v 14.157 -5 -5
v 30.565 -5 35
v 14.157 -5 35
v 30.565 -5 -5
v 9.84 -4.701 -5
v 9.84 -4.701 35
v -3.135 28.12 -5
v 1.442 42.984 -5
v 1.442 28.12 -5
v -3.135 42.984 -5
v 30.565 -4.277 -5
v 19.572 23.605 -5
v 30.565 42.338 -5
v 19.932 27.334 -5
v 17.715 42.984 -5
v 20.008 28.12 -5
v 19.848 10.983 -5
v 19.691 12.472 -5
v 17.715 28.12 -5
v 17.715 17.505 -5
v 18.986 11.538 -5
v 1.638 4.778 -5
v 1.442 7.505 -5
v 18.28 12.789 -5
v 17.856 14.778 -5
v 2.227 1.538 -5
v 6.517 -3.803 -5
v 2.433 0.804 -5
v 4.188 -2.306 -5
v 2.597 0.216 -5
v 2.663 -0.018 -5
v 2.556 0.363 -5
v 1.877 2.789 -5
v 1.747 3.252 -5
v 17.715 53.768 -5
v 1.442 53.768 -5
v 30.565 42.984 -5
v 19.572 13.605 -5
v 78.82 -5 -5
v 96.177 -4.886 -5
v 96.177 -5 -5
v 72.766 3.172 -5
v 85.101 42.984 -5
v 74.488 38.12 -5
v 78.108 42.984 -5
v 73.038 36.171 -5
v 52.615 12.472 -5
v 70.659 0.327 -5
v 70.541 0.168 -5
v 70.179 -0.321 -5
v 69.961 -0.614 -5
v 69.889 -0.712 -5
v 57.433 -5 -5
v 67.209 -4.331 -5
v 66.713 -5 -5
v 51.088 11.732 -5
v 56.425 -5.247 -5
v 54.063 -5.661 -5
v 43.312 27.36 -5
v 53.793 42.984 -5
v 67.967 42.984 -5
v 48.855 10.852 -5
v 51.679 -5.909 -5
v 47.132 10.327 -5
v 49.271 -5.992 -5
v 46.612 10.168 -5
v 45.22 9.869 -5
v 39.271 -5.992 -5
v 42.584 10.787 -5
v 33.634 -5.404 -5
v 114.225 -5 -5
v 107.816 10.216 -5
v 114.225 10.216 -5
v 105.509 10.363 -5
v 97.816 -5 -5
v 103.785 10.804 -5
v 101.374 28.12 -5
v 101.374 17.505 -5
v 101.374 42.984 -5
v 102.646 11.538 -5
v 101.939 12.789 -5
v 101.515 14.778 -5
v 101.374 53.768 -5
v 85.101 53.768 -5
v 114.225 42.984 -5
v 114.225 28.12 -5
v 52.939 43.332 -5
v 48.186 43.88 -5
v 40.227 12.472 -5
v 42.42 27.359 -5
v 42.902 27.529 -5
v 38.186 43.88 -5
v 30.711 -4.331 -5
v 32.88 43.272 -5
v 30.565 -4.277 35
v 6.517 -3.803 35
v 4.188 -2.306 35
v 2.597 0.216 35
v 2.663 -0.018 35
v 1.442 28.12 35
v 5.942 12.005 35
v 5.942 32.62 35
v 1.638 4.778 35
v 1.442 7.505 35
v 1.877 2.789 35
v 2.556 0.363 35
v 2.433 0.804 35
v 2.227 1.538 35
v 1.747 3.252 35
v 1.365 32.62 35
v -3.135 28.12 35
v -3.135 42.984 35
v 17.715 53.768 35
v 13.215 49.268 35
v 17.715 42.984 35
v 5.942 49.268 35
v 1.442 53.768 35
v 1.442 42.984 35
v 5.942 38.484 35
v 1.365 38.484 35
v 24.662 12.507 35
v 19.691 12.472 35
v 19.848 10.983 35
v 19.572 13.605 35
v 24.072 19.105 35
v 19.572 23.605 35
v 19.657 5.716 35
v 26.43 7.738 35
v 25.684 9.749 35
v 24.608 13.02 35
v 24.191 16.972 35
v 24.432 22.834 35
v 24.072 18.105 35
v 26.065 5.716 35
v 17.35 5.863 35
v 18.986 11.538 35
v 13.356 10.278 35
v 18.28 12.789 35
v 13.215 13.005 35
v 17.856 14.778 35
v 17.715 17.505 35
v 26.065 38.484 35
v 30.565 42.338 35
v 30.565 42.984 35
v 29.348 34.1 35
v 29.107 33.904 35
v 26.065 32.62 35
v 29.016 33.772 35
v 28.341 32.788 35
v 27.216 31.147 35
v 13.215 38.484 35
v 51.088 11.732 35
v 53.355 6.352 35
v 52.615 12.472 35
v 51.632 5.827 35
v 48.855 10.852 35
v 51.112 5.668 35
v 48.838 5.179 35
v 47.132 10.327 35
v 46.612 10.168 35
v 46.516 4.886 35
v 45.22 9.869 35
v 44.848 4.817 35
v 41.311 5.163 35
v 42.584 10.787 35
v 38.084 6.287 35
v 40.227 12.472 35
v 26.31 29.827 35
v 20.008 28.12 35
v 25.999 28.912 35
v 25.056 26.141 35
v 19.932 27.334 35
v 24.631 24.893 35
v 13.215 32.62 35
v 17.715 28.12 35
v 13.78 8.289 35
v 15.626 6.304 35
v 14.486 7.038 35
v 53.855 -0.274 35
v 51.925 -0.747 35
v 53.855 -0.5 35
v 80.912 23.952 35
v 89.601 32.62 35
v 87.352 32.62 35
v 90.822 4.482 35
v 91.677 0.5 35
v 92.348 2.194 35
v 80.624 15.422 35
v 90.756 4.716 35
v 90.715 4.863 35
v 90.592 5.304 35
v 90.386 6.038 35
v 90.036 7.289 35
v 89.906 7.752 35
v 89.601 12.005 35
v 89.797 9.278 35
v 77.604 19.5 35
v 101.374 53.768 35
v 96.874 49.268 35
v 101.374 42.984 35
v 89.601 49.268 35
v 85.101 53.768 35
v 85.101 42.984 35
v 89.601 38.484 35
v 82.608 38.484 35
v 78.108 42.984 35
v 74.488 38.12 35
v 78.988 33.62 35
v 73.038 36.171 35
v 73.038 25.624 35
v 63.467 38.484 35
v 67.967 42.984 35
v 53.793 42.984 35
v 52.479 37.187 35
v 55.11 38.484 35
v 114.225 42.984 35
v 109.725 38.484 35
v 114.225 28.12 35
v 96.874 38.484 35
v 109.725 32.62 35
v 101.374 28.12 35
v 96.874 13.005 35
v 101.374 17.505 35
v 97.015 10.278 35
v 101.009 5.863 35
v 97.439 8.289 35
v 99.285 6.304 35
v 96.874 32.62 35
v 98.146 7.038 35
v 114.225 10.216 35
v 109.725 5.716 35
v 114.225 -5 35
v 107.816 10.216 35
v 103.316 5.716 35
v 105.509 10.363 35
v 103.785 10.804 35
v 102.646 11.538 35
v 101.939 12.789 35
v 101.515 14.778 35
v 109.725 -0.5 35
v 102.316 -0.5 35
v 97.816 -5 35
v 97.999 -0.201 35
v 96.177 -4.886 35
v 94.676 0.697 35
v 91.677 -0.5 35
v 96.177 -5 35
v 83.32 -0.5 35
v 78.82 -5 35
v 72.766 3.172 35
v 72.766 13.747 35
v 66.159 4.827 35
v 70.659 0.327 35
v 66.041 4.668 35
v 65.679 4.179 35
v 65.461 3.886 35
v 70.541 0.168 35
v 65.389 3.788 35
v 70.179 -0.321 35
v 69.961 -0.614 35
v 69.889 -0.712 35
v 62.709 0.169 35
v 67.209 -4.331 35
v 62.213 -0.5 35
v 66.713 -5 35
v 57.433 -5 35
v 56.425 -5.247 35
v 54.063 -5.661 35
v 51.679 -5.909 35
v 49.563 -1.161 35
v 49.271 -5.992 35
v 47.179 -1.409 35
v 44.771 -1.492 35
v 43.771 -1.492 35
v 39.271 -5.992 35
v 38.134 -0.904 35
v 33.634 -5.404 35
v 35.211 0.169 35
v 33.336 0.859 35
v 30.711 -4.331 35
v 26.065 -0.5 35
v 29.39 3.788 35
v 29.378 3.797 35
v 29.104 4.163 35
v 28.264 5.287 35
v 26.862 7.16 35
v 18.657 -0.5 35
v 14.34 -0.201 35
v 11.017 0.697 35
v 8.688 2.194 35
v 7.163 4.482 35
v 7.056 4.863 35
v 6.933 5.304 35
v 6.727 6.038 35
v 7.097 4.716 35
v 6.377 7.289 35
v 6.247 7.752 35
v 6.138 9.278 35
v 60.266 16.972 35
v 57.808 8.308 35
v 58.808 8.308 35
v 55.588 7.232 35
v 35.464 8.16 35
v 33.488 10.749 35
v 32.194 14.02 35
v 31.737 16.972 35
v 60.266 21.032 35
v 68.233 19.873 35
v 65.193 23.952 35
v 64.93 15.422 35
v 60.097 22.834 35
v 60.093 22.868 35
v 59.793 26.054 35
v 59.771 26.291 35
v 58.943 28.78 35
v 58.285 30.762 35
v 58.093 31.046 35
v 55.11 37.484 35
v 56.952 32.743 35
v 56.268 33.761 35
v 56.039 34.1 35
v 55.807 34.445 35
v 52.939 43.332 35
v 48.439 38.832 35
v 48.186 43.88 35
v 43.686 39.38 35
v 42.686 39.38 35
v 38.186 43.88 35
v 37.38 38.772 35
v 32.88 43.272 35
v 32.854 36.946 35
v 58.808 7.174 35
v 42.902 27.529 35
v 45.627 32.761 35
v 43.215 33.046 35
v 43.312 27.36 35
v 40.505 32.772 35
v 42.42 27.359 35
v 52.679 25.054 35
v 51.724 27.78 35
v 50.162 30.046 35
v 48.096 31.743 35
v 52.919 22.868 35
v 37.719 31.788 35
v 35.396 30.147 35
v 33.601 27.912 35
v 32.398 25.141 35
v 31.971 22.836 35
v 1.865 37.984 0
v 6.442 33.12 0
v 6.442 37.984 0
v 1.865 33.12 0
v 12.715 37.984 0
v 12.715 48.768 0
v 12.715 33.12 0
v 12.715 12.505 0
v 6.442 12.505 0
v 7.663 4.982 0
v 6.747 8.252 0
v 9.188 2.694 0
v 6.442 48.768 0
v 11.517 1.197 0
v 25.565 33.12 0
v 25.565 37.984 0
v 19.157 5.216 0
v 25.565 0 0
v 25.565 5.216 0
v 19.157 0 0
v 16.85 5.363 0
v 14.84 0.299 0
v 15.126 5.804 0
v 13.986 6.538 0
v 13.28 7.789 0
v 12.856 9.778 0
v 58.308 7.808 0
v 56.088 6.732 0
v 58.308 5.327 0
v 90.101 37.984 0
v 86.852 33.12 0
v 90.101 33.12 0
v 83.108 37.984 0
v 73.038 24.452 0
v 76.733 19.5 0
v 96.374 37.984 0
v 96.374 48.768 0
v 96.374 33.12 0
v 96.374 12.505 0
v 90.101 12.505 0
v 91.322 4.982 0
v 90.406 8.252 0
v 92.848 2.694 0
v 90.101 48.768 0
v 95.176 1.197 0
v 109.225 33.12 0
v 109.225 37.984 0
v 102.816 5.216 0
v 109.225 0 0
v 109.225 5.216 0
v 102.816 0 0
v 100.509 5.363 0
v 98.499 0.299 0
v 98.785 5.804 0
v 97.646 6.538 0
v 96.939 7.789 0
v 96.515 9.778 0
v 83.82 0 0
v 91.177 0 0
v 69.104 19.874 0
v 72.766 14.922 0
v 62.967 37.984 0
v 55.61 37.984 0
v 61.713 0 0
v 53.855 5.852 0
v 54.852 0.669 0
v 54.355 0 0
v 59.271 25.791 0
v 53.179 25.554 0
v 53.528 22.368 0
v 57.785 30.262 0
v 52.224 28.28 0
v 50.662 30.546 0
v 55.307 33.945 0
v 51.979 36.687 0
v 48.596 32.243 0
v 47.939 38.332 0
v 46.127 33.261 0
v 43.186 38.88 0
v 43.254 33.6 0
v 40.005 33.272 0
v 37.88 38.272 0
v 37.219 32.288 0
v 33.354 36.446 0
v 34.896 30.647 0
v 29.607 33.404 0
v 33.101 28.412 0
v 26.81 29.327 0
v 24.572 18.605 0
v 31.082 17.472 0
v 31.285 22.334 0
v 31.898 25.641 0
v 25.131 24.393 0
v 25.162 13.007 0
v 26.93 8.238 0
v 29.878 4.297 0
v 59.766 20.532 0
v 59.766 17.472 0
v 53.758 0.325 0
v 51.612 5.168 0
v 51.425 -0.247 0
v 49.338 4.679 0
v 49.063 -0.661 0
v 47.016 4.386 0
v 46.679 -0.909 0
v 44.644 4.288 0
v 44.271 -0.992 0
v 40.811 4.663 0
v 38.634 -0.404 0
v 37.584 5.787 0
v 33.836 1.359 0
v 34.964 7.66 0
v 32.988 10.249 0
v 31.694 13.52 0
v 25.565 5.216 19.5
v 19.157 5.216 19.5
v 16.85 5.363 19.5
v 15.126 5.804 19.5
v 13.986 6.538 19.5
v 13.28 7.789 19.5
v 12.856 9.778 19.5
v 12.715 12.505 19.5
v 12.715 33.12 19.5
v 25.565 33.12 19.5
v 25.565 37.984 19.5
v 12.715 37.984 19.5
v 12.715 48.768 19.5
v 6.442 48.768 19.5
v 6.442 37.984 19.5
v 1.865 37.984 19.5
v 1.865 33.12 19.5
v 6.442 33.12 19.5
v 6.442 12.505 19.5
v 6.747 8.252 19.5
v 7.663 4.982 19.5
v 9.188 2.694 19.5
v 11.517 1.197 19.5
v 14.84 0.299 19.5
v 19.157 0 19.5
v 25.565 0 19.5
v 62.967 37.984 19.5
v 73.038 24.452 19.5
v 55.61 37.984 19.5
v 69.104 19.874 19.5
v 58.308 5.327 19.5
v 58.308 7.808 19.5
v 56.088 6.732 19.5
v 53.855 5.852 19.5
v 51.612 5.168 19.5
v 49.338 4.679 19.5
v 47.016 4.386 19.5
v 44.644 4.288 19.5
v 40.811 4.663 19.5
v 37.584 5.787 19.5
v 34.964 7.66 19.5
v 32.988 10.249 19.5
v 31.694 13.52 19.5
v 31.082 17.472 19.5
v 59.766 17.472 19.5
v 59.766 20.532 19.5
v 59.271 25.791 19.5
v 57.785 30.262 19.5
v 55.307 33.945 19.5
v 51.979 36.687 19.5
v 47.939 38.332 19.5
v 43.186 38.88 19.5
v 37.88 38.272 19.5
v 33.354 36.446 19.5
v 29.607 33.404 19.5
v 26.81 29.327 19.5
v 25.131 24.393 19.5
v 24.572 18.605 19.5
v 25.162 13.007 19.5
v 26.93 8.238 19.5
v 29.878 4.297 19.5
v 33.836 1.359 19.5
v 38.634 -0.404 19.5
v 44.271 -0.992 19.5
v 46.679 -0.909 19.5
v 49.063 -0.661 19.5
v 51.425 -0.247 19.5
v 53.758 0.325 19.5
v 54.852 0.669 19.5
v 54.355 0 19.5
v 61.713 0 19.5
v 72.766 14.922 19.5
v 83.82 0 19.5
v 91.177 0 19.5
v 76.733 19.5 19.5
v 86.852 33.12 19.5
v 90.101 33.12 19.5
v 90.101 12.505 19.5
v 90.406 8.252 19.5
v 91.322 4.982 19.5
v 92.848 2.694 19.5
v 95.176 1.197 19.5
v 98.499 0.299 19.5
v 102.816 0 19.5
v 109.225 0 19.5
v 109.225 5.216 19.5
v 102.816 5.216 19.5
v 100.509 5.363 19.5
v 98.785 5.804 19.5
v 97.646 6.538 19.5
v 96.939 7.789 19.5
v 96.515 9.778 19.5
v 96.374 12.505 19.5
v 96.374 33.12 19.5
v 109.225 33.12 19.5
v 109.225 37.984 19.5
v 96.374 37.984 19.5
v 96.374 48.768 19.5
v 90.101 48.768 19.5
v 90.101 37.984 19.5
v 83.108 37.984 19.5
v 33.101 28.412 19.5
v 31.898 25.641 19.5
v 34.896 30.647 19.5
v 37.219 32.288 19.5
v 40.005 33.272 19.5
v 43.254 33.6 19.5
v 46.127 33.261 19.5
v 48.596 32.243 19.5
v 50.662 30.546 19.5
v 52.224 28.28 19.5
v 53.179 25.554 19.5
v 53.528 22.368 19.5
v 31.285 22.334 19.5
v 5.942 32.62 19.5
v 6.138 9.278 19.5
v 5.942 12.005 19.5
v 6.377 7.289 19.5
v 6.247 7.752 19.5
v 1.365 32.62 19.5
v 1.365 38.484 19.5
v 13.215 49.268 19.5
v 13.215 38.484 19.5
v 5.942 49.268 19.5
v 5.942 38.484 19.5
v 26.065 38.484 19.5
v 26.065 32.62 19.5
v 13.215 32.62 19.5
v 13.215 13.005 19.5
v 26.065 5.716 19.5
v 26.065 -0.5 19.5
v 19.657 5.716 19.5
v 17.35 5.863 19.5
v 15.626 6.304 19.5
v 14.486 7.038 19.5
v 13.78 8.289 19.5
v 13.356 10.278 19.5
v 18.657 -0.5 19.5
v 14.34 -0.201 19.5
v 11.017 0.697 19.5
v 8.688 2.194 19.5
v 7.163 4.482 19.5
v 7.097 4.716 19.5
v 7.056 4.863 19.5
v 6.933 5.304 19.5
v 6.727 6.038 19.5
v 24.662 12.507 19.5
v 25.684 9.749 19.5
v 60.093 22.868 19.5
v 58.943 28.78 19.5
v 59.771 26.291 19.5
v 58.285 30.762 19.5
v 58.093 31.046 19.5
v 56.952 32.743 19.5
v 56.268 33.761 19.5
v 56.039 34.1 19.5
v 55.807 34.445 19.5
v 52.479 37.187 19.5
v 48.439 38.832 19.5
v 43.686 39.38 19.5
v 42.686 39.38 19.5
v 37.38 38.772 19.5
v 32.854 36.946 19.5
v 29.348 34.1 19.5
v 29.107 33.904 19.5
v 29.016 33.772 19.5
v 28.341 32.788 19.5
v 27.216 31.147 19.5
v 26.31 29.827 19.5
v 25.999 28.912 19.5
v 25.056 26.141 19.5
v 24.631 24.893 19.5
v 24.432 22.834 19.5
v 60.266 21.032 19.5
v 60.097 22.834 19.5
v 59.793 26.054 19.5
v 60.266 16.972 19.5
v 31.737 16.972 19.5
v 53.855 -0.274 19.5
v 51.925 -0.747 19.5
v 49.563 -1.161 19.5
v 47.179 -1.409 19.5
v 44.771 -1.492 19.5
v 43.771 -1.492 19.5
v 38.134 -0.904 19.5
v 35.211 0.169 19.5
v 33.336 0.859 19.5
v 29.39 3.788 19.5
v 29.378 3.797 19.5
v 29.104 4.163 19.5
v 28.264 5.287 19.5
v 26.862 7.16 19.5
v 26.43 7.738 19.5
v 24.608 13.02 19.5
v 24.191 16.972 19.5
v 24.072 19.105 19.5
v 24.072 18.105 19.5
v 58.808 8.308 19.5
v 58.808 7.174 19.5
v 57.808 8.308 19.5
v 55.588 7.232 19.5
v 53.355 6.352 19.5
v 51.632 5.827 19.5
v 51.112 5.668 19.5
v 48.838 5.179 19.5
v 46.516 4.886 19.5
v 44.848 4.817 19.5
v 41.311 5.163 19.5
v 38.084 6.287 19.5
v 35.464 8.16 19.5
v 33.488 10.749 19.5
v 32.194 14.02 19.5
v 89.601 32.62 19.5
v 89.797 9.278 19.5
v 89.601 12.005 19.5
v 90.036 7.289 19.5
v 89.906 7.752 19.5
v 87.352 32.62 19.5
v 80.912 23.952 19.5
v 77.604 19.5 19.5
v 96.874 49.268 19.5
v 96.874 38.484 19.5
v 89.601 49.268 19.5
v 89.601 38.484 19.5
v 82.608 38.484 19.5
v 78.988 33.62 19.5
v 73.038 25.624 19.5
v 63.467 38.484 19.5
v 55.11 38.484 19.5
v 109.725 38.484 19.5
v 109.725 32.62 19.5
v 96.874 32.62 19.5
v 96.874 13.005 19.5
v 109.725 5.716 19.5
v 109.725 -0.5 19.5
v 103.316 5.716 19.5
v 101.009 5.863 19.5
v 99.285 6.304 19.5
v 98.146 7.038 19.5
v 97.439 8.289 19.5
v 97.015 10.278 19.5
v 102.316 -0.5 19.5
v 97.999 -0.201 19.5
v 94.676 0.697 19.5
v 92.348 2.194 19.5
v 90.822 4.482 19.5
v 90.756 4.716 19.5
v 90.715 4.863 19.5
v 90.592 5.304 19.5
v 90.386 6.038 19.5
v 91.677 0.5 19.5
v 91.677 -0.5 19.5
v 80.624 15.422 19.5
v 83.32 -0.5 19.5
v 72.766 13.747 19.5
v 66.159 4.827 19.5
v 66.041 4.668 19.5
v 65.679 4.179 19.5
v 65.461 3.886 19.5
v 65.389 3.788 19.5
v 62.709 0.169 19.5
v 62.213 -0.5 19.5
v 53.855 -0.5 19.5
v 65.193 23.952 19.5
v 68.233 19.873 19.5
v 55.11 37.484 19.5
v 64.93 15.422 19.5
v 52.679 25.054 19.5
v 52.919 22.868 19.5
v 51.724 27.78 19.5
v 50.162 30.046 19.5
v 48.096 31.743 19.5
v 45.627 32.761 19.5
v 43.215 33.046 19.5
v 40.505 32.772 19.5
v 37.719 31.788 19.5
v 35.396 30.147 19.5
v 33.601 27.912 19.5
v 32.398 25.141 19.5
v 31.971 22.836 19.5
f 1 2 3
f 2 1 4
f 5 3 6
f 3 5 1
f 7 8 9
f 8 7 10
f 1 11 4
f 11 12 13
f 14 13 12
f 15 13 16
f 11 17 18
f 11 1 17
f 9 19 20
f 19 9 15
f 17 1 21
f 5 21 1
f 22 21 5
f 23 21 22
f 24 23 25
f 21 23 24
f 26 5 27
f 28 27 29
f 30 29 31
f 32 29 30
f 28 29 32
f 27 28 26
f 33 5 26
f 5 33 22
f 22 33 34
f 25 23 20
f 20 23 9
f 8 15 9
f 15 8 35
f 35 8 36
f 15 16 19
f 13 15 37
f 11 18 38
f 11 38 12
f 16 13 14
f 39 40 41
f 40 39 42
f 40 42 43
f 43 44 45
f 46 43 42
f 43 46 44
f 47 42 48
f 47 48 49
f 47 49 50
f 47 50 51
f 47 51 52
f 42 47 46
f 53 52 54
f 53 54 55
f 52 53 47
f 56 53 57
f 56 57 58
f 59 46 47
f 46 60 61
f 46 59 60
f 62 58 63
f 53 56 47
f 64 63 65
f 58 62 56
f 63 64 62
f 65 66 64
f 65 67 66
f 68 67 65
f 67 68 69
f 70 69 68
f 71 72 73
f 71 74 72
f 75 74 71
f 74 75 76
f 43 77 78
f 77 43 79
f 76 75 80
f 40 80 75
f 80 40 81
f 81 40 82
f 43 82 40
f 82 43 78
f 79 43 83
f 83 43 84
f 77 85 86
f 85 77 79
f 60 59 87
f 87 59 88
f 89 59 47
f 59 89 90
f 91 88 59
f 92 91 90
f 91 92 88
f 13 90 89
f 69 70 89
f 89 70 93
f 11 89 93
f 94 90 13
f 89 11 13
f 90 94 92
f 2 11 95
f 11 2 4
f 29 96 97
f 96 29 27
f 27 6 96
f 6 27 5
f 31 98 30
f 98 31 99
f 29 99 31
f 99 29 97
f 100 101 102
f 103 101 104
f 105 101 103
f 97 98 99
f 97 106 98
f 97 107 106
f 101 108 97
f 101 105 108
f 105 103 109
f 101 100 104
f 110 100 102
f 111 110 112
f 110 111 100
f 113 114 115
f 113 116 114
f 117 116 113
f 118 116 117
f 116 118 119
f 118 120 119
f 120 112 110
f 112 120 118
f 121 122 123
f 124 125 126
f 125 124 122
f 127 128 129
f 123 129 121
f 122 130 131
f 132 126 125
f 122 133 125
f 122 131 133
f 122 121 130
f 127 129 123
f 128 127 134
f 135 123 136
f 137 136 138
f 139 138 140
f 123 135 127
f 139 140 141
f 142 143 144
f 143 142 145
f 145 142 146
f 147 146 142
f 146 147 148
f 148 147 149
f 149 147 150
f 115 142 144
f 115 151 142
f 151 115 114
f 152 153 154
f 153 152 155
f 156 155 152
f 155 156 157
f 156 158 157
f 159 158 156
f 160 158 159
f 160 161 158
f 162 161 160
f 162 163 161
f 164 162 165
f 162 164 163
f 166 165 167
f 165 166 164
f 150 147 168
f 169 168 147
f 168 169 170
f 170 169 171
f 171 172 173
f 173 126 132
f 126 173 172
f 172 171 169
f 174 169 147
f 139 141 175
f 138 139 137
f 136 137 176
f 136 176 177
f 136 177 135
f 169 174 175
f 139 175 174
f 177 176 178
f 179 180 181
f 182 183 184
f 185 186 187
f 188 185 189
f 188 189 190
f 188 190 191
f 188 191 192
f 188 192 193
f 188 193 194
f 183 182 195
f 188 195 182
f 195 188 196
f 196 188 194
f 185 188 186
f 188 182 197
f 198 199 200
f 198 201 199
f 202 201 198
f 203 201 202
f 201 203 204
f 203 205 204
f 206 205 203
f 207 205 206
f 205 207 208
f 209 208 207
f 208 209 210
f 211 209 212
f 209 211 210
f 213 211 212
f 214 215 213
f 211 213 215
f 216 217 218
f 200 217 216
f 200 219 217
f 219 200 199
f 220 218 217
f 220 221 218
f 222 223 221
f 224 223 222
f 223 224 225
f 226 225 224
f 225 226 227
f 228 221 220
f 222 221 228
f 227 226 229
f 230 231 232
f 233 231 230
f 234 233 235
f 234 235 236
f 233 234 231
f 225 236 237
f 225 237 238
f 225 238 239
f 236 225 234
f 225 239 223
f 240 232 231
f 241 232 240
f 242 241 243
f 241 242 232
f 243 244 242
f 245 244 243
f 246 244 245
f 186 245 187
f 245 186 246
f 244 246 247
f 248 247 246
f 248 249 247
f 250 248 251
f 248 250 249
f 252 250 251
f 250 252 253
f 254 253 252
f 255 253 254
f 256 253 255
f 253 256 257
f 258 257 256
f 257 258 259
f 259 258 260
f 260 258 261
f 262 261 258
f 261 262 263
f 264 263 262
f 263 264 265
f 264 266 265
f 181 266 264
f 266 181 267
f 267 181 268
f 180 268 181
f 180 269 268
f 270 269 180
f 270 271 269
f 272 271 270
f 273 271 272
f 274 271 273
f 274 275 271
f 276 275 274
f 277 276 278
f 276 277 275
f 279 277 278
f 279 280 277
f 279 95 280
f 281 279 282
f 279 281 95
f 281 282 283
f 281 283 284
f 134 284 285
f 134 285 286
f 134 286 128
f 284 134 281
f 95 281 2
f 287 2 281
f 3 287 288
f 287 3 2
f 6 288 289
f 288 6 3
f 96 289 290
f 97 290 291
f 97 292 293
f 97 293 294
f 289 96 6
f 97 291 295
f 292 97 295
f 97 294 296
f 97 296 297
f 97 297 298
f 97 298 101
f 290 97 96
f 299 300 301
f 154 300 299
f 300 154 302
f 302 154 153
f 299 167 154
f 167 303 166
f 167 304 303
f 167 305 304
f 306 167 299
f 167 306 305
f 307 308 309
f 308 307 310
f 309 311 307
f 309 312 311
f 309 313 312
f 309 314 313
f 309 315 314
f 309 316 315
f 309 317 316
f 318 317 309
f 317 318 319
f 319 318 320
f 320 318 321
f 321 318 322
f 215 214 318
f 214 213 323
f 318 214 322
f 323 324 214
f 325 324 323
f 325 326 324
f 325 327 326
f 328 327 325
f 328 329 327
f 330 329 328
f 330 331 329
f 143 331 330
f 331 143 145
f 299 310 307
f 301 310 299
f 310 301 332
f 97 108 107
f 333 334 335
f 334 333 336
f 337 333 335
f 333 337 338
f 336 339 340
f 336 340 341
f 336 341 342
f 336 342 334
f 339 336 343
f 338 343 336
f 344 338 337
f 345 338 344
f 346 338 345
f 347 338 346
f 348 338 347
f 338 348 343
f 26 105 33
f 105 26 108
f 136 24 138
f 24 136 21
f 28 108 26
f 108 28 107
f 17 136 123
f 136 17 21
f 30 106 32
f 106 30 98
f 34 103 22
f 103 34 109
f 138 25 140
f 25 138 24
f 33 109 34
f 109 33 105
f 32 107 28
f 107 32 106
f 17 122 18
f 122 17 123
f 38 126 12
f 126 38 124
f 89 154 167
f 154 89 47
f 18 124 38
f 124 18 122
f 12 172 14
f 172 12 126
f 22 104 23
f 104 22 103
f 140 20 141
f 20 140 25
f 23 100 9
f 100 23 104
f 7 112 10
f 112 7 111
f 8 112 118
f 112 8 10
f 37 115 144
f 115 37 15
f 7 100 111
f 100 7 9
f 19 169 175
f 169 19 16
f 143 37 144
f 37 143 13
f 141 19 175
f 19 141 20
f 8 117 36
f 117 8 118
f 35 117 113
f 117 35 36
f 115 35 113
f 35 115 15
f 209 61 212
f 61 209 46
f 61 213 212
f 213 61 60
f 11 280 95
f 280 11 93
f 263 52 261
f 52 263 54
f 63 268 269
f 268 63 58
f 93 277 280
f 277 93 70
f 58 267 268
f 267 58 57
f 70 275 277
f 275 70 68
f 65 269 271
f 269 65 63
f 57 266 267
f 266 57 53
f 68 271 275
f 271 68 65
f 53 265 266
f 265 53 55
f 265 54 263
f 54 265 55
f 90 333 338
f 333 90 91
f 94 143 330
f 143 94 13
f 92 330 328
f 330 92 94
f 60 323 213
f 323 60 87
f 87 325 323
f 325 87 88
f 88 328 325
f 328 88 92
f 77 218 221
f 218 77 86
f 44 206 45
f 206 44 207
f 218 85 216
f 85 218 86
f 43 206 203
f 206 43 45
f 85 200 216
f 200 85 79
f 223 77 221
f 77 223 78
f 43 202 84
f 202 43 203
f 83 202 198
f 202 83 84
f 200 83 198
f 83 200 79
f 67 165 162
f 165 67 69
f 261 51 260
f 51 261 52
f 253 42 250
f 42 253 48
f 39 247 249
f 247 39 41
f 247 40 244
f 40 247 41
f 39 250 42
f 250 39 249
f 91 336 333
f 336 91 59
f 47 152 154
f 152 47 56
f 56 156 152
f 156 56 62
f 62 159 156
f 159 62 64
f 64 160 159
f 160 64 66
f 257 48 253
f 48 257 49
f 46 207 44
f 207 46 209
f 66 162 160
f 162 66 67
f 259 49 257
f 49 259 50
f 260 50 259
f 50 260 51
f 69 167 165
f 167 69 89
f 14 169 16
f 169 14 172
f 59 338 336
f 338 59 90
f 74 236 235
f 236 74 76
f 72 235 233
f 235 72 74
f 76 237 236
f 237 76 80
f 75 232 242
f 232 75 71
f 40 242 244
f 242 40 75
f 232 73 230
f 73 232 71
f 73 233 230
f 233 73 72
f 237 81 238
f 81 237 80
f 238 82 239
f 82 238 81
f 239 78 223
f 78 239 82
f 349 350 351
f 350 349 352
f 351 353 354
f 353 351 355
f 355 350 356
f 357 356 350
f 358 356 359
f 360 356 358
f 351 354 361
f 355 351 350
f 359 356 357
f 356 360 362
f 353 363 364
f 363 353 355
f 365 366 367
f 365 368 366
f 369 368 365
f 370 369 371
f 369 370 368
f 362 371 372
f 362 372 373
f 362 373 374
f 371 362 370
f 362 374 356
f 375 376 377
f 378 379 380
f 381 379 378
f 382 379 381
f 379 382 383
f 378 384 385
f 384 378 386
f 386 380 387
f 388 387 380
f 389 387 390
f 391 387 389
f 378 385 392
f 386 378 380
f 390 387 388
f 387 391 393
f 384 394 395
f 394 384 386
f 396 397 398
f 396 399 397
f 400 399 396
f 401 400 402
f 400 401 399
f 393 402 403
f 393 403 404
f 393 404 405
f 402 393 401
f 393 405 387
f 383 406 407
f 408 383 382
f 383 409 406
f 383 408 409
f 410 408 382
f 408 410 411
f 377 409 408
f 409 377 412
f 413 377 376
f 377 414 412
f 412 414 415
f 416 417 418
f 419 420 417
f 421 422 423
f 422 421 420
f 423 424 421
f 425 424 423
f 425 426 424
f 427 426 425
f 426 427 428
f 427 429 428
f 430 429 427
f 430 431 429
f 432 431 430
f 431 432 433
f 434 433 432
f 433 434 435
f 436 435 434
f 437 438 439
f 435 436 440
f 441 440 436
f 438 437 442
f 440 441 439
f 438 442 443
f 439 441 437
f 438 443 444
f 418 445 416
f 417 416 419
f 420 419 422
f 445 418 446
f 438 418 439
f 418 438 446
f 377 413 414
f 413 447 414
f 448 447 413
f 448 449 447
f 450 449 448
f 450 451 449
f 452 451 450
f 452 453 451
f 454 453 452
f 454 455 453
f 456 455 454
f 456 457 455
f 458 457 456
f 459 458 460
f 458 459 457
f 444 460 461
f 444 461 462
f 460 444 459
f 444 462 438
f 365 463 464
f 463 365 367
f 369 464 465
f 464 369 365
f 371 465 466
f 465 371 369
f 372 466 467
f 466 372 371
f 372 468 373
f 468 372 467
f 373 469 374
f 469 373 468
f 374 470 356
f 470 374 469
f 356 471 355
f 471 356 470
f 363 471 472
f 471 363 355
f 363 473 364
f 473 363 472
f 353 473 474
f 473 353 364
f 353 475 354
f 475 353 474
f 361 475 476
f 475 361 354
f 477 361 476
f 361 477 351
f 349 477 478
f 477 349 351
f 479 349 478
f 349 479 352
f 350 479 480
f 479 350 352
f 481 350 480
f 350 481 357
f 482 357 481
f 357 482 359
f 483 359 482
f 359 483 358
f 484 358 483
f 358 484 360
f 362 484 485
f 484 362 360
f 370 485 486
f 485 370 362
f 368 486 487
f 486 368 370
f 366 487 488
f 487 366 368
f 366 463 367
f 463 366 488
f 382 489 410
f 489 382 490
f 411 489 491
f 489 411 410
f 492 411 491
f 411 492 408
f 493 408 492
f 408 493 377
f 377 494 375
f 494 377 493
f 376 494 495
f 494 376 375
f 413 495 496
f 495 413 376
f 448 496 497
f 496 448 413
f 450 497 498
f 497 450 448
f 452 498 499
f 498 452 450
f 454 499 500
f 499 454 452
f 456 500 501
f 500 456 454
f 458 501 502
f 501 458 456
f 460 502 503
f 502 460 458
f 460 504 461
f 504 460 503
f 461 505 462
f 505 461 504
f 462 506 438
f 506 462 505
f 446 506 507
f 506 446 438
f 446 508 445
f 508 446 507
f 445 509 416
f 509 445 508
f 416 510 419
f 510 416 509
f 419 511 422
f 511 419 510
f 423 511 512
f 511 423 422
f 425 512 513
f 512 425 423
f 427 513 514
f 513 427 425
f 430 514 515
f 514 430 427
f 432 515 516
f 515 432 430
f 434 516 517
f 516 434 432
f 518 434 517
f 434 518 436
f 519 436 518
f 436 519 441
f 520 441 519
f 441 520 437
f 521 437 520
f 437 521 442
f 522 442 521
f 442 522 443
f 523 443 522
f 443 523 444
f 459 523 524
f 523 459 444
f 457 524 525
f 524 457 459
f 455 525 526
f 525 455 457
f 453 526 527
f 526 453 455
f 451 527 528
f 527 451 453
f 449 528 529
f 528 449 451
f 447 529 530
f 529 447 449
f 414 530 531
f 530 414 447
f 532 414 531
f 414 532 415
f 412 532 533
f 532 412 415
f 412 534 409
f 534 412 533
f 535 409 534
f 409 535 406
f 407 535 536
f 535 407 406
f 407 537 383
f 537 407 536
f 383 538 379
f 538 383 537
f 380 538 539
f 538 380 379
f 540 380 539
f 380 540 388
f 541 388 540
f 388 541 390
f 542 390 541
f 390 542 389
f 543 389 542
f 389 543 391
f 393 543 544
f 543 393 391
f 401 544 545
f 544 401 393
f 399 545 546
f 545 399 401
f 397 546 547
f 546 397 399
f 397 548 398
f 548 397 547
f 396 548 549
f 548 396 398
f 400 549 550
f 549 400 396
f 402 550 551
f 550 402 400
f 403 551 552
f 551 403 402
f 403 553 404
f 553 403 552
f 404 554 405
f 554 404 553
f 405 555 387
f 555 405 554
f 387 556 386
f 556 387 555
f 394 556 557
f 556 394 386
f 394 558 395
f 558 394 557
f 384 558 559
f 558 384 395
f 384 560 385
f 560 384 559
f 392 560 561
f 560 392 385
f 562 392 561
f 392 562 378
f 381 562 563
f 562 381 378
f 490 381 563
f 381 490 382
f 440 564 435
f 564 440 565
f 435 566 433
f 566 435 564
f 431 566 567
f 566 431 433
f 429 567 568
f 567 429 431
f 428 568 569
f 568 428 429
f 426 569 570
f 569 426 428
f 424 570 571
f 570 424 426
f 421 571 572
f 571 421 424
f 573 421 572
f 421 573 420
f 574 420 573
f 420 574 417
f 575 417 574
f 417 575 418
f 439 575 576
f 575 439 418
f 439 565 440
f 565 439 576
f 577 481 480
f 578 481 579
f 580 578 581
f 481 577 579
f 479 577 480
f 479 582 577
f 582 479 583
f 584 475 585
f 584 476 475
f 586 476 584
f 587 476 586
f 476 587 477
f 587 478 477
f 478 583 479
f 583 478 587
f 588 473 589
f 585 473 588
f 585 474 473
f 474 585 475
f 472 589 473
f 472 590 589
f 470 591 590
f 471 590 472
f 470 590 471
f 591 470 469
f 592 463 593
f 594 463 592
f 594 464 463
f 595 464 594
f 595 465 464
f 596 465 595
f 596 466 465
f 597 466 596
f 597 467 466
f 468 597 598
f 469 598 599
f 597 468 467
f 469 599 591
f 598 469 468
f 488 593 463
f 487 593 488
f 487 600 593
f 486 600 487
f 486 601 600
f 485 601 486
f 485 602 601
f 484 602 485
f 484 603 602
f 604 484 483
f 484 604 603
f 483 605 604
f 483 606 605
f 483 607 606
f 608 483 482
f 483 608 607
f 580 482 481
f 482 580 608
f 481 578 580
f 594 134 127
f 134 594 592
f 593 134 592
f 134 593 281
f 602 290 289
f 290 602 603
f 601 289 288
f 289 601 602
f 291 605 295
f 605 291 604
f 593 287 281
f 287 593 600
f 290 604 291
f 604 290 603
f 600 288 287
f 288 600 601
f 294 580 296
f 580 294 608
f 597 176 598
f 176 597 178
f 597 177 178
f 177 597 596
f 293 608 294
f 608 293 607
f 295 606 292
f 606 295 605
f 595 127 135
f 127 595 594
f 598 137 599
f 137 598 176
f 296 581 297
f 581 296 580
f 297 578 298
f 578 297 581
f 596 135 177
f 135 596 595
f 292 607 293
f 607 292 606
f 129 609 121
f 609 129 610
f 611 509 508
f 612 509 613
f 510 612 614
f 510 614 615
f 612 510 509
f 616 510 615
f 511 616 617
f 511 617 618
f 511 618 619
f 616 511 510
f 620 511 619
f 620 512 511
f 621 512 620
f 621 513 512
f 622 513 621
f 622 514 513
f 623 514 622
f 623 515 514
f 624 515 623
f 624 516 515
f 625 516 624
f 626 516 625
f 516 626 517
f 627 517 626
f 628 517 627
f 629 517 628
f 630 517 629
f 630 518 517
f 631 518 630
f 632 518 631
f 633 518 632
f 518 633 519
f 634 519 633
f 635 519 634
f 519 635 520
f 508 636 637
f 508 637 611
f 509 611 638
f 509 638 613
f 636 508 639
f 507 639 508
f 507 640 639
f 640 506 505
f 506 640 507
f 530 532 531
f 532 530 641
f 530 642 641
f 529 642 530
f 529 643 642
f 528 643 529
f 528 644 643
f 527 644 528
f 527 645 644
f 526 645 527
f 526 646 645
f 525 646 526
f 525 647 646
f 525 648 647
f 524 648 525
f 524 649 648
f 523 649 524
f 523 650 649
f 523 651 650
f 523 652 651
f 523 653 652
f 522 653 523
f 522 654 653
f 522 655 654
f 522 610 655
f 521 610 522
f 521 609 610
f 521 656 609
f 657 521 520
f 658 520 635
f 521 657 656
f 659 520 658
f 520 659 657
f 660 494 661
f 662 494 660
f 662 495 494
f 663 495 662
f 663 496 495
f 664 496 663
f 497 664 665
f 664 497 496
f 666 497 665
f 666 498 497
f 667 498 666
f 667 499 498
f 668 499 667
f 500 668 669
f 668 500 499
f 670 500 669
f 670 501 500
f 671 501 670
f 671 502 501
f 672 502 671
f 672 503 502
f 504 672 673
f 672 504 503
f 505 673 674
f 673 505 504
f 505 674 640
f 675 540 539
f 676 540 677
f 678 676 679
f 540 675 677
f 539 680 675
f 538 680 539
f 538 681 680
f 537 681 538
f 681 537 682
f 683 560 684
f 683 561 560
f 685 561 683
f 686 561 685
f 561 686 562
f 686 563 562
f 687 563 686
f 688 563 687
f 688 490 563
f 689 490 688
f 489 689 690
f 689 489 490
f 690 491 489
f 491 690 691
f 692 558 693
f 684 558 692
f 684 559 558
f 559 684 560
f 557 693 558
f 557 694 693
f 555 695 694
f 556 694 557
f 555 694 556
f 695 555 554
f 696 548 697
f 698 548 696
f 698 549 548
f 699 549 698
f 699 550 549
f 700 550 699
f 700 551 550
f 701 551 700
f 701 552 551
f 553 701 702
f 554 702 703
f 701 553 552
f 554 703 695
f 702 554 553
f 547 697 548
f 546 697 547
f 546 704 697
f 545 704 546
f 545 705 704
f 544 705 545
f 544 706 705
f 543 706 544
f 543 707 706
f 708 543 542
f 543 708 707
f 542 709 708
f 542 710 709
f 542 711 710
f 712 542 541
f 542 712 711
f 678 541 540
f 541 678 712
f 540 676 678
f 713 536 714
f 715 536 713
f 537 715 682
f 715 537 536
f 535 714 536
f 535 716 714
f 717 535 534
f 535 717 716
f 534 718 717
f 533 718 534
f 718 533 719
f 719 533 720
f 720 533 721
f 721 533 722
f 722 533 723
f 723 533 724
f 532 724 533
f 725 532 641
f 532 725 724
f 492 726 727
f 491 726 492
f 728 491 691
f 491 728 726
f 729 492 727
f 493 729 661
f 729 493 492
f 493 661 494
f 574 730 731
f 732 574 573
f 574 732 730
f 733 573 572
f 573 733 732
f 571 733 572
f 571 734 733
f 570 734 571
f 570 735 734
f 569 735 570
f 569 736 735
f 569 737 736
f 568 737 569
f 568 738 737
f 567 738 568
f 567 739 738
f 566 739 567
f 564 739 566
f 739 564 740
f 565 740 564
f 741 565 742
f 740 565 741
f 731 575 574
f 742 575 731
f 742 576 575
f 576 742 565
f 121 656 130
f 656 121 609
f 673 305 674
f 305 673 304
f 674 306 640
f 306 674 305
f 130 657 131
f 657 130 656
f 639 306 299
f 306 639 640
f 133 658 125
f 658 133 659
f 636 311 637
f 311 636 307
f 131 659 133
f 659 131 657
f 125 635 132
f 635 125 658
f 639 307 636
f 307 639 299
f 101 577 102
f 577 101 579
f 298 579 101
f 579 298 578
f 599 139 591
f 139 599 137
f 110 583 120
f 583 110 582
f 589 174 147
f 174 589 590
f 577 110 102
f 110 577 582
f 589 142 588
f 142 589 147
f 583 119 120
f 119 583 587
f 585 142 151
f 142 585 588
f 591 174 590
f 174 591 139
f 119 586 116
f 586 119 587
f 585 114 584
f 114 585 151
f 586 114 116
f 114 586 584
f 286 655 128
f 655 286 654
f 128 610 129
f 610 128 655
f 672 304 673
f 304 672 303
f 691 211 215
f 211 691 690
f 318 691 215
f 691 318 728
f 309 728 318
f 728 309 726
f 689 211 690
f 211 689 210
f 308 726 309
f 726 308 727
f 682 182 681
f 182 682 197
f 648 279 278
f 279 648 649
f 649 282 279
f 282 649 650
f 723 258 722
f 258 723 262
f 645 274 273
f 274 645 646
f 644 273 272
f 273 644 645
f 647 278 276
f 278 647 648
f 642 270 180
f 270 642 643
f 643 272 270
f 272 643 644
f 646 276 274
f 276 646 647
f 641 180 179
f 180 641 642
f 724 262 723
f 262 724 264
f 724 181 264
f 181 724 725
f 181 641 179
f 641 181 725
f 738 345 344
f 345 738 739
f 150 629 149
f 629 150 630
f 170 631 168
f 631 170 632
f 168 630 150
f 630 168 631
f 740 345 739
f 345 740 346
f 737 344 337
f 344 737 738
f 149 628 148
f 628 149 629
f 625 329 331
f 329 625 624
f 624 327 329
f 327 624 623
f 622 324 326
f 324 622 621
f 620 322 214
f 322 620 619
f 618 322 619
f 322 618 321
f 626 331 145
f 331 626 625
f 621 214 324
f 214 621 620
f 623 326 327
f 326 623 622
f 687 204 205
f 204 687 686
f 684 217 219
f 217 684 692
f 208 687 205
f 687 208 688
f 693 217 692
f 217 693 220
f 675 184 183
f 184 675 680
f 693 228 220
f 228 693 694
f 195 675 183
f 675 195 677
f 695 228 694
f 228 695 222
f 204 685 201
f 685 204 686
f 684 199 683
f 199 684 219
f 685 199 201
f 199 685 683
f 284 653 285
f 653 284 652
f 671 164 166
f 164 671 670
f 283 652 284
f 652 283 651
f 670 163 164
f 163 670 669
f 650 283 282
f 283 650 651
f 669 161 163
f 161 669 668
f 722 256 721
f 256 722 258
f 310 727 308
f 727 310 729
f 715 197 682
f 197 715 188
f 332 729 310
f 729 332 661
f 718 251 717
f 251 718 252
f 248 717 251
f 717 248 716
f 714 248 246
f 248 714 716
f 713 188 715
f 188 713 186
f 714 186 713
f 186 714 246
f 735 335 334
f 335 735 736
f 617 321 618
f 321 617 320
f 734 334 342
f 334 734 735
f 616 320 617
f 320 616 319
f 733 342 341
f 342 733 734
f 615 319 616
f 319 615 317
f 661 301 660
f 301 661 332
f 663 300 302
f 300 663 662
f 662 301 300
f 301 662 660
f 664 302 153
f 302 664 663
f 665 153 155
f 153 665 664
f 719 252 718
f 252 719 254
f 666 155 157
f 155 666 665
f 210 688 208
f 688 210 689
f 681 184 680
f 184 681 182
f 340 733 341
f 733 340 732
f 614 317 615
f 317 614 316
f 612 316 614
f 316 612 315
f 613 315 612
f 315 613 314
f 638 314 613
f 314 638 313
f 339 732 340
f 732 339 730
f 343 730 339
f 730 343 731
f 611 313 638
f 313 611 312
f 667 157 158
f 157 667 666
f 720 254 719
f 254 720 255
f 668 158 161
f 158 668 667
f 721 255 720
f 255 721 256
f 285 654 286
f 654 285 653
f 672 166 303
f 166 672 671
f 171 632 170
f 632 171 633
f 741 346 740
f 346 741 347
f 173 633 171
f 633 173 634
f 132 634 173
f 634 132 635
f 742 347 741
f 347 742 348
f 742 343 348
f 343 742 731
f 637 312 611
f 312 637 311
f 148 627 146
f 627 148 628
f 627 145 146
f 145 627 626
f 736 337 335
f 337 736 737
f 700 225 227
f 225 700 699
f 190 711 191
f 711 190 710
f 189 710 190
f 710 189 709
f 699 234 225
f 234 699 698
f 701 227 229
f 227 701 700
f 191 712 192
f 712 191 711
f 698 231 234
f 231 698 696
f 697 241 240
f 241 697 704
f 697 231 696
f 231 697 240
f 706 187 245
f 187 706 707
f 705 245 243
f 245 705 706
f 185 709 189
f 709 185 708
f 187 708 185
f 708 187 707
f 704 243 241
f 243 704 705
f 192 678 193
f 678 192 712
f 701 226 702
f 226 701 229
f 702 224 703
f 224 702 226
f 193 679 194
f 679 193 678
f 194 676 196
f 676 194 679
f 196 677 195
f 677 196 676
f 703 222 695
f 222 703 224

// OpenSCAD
font = "Sarabun:style=Bold Italic";

string = "text";

// $fn = 100; higher render quality
$fn = 20;
height = 30;
font_size = 50;
spacing = .78;

wall = 10;

// bottom letters are thicker to support
// the top letters

bottom_height = height * 2;

wall_mount_y_top = 120;

difference(){
    letter(string, font, font_size, height, wall);
}


module letter(character, font, font_size, height, wall, support_wall_sub, hollow=true) {
    difference() {
        hollow_letter(character, font, font_size, height, wall, hollow=hollow);
        
        if (hollow){
            translate([0,0,(wall/2)- height/2])
            support(character, font, font_size, height, wall, support_wall_sub);
        }
    }
}

module make_text(character, font, font_size, height){
    linear_extrude(height=height)
    text(text=character,size=font_size,font=font,spacing=spacing);
}

module hollow_letter(character, font, font_size, height, wall, support_wall_sub, hollow =true) {
    difference(){
        minkowski(){
            make_text(character, font, font_size, height);
            cube([wall,wall,wall],center=true);
        }
        
        if (hollow){
            make_text(character, font, font_size, height);
        }
    }
}

module support(character, font, font_size, height, wall, wall_sub) {
    color("pink")
    translate([0,0,height])
    minkowski() {
        make_text(character, font, font_size, height);
        cube(wall - wall_sub, center=true);
    }
}
